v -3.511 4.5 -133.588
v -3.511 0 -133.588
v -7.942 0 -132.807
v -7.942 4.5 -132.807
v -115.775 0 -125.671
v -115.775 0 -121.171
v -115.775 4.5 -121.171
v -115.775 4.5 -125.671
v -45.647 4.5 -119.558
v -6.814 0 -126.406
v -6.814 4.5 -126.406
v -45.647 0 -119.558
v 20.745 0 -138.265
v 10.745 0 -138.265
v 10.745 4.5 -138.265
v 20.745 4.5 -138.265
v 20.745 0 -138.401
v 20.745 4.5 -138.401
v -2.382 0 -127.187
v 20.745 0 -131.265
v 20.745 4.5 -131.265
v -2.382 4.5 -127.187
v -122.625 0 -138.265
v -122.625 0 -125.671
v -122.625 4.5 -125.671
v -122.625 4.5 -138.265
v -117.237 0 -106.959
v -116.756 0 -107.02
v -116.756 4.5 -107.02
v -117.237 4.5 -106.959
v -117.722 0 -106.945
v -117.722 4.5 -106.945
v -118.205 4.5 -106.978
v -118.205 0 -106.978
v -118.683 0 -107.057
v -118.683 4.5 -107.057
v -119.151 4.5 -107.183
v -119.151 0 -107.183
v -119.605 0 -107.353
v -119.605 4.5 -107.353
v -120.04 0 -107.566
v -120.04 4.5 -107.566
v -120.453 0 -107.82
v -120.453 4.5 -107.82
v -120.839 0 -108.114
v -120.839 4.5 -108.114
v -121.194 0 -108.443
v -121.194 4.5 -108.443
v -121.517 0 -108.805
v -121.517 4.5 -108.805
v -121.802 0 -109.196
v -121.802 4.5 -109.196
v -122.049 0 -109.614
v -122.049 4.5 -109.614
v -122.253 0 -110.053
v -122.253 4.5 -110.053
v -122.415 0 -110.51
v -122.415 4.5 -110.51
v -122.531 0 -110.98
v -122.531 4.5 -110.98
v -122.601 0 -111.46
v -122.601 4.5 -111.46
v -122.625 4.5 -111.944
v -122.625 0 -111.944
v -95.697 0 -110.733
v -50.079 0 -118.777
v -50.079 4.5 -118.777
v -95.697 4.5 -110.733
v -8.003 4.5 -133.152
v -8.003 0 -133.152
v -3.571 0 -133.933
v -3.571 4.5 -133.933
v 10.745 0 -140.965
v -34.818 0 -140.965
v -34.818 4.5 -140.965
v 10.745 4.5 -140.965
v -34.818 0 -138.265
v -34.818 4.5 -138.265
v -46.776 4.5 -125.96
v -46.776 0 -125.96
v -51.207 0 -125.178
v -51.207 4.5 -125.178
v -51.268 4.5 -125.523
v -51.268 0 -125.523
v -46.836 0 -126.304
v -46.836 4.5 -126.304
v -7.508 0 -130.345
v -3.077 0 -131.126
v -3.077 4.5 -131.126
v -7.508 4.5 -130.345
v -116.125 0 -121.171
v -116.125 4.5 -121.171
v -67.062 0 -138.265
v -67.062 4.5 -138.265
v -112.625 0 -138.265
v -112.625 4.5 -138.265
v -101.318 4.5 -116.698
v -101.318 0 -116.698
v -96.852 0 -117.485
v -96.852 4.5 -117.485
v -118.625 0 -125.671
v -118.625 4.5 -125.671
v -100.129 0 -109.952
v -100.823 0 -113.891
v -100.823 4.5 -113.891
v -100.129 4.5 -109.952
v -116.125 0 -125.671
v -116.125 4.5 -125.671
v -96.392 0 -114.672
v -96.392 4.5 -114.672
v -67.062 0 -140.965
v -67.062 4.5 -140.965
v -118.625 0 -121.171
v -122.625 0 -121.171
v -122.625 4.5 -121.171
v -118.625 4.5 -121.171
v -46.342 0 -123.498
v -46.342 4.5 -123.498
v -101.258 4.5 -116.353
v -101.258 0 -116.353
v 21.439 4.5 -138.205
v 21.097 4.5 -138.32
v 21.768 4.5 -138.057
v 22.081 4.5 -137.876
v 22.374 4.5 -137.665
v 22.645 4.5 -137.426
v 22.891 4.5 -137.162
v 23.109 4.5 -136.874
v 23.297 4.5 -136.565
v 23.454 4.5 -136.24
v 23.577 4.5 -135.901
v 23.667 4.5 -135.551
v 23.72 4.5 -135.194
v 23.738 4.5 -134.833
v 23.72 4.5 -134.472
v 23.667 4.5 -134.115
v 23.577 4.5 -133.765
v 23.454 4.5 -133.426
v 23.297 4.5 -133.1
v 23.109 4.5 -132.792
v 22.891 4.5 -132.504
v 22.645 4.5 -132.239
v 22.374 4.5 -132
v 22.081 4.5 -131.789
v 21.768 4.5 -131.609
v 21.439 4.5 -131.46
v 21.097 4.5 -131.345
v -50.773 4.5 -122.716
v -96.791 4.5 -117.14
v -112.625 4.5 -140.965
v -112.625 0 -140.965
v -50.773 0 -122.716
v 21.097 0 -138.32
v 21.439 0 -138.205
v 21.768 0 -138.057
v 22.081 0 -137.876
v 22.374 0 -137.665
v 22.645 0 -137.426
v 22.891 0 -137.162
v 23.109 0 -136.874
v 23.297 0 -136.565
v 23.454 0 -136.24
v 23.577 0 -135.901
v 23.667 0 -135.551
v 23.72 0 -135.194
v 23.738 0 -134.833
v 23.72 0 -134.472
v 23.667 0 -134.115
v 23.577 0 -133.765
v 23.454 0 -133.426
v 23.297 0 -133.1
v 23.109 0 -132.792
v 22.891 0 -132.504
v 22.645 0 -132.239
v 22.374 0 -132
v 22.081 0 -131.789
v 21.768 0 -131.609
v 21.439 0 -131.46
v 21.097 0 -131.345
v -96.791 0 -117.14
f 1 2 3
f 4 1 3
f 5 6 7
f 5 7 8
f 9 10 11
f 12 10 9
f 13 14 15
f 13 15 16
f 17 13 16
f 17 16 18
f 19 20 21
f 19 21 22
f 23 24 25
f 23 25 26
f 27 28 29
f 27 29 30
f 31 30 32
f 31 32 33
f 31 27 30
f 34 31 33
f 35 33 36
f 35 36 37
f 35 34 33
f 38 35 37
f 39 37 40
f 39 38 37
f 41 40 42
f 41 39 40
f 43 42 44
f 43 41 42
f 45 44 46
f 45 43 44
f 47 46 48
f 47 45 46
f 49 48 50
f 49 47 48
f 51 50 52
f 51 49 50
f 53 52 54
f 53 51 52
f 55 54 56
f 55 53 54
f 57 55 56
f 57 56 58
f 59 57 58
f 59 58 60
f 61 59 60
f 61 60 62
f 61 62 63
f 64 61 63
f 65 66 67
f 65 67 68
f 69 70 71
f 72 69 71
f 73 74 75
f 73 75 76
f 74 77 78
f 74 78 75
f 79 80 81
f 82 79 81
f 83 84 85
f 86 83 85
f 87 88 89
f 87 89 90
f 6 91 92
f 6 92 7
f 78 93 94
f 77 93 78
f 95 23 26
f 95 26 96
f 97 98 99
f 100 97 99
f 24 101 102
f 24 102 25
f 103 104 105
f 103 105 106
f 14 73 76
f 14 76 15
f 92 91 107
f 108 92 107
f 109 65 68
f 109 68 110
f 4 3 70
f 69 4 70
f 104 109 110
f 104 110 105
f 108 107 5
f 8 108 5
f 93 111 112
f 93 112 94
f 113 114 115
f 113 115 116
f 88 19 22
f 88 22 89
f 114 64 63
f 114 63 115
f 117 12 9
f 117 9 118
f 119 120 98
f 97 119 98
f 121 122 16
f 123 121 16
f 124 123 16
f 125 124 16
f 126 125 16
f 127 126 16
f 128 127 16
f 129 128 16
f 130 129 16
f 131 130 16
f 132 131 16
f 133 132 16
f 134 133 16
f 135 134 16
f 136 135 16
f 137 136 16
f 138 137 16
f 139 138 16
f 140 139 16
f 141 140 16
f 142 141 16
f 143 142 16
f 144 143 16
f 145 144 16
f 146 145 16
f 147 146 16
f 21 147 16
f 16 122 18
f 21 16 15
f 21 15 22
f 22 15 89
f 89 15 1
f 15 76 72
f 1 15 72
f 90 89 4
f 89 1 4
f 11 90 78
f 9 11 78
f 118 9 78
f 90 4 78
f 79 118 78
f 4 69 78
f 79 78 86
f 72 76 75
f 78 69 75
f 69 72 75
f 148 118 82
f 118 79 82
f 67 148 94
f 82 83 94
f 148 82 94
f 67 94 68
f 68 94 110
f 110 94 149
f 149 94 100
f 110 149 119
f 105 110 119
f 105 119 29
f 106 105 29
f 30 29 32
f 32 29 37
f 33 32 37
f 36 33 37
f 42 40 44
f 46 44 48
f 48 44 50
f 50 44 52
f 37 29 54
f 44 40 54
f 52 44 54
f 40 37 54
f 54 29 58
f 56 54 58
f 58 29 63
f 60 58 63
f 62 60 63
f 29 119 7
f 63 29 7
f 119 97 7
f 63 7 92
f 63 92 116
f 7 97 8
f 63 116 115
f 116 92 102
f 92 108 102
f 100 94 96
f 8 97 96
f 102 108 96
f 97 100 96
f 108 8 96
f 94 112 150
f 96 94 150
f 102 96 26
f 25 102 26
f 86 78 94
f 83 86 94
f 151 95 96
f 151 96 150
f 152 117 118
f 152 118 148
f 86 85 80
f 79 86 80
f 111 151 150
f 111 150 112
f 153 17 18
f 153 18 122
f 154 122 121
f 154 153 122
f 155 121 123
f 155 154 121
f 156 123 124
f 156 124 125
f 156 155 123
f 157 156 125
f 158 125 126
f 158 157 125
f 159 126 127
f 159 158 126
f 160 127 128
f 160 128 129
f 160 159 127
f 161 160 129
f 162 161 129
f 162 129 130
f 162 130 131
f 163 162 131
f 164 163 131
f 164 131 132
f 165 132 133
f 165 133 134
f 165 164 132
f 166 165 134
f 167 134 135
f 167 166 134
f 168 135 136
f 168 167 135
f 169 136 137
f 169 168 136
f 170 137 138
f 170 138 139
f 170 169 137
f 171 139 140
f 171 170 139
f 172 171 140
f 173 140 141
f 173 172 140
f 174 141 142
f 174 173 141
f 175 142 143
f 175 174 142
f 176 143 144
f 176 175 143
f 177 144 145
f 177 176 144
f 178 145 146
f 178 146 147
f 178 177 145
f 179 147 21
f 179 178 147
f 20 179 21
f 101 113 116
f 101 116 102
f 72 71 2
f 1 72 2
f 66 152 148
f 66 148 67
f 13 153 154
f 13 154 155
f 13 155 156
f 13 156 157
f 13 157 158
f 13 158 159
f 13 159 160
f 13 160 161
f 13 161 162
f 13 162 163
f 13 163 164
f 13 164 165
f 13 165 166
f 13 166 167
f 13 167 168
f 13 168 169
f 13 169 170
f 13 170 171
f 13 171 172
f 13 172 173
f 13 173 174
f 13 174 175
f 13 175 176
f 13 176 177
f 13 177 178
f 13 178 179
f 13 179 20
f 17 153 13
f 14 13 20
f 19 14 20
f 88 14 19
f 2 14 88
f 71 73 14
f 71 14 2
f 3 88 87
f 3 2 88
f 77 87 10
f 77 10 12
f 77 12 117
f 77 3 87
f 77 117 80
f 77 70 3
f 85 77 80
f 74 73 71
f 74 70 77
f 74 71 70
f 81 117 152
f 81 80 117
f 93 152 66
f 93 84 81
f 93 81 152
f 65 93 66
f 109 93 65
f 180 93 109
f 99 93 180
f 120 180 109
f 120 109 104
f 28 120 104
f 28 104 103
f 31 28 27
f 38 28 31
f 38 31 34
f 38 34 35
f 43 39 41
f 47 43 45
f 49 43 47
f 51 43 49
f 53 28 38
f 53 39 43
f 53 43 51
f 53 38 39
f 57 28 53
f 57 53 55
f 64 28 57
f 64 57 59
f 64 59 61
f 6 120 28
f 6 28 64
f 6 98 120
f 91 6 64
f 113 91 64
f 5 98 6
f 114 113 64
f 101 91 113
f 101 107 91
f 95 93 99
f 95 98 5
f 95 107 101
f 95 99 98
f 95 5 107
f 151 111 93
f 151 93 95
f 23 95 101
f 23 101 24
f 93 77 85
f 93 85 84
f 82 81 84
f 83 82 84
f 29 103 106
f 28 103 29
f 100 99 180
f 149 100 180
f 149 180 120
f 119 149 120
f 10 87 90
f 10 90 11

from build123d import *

# Parameters (mm, degrees)
SKETCH1_W           = 0.35
SKETCH1_H           = 4.5
BOSS_EXTRUDE1_DEPTH = 4.5


with BuildPart() as part:
    # Sketch1 → Boss-Extrude1 (new body)
    with BuildSketch(Plane(origin=(0, 0, 0), x_dir=(1, 0, 0), z_dir=(0, 1, 0))):
        with BuildLine():
            Line((-112.624700466, 140.964918284), (-67.062250697, 140.964918284))
            Line((-67.062250697, 140.964918284), (-67.062250697, 138.264918284))
            Line((-67.062250697, 138.264918284), (-34.817903115, 138.264918284))
            Line((-34.817903115, 138.264918284), (-34.817903115, 140.964918284))
            Line((-34.817903115, 140.964918284), (10.744546655, 140.964918284))
            Line((10.744546655, 140.964918284), (10.744546655, 138.264918284))
            Line((10.744546655, 138.264918284), (20.744546655, 138.264918284))
            Line((20.744546655, 138.264918284), (20.744546655, 138.400653035))
            ThreePointArc((20.744546655, 138.400653035), (23.738342853, 134.832785659), (20.744546655, 131.264918284))
            Line((20.744546655, 131.264918284), (-2.381937072, 127.187095234))
            Line((-2.381937072, 127.187095234), (-3.076529782, 131.126326246))
            Line((-3.076529782, 131.126326246), (-7.508164671, 130.344909446))
            Line((-7.508164671, 130.344909446), (-6.81357196, 126.405678434))
            Line((-6.81357196, 126.405678434), (-45.647003133, 119.558296765))
            Line((-45.647003133, 119.558296765), (-46.341595844, 123.497527777))
            Line((-46.341595844, 123.497527777), (-50.773230733, 122.716110978))
            Line((-50.773230733, 122.716110978), (-50.078638022, 118.776879966))
            Line((-50.078638022, 118.776879966), (-95.69726199, 110.733085737))
            Line((-95.69726199, 110.733085737), (-96.3918547, 114.672316749))
            Line((-96.3918547, 114.672316749), (-100.823489589, 113.89089995))
            Line((-100.823489589, 113.89089995), (-100.128896878, 109.951668938))
            Line((-100.128896878, 109.951668938), (-116.756459578, 107.01978101))
            ThreePointArc((-116.756459578, 107.01978101), (-120.838638515, 108.11359756), (-122.624700466, 111.943819775))
            Line((-122.624700466, 111.943819775), (-122.624700466, 121.171097677))
            Line((-122.624700466, 121.171097677), (-118.624700466, 121.171097677))
            Line((-118.624700466, 121.171097677), (-118.624700466, 125.671097677))
            Line((-118.624700466, 125.671097677), (-122.624700466, 125.671097677))
            Line((-122.624700466, 125.671097677), (-122.624700466, 138.264918284))
            Line((-122.624700466, 138.264918284), (-112.624700466, 138.264918284))
            Line((-112.624700466, 138.264918284), (-112.624700466, 140.964918284))
        make_face()
        Polygon((-3.510650226, 133.588345628), (-7.942285115, 132.806928829), (-8.003061977, 133.151611543), (-3.571427089, 133.933028342), align=None, mode=Mode.SUBTRACT)
        Polygon((-46.775716288, 125.95954716), (-51.207351177, 125.17813036), (-51.268128039, 125.522813074), (-46.83649315, 126.304229873), align=None, mode=Mode.SUBTRACT)
        Polygon((-96.791107352, 117.140484264), (-101.257610033, 116.352919332), (-101.318386895, 116.697602046), (-96.851884214, 117.485166978), align=None, mode=Mode.SUBTRACT)
        with Locations((-115.949700466, 123.421097677)):
            Rectangle(SKETCH1_W, SKETCH1_H, mode=Mode.SUBTRACT)
    extrude(amount=BOSS_EXTRUDE1_DEPTH)


solid = part.part
